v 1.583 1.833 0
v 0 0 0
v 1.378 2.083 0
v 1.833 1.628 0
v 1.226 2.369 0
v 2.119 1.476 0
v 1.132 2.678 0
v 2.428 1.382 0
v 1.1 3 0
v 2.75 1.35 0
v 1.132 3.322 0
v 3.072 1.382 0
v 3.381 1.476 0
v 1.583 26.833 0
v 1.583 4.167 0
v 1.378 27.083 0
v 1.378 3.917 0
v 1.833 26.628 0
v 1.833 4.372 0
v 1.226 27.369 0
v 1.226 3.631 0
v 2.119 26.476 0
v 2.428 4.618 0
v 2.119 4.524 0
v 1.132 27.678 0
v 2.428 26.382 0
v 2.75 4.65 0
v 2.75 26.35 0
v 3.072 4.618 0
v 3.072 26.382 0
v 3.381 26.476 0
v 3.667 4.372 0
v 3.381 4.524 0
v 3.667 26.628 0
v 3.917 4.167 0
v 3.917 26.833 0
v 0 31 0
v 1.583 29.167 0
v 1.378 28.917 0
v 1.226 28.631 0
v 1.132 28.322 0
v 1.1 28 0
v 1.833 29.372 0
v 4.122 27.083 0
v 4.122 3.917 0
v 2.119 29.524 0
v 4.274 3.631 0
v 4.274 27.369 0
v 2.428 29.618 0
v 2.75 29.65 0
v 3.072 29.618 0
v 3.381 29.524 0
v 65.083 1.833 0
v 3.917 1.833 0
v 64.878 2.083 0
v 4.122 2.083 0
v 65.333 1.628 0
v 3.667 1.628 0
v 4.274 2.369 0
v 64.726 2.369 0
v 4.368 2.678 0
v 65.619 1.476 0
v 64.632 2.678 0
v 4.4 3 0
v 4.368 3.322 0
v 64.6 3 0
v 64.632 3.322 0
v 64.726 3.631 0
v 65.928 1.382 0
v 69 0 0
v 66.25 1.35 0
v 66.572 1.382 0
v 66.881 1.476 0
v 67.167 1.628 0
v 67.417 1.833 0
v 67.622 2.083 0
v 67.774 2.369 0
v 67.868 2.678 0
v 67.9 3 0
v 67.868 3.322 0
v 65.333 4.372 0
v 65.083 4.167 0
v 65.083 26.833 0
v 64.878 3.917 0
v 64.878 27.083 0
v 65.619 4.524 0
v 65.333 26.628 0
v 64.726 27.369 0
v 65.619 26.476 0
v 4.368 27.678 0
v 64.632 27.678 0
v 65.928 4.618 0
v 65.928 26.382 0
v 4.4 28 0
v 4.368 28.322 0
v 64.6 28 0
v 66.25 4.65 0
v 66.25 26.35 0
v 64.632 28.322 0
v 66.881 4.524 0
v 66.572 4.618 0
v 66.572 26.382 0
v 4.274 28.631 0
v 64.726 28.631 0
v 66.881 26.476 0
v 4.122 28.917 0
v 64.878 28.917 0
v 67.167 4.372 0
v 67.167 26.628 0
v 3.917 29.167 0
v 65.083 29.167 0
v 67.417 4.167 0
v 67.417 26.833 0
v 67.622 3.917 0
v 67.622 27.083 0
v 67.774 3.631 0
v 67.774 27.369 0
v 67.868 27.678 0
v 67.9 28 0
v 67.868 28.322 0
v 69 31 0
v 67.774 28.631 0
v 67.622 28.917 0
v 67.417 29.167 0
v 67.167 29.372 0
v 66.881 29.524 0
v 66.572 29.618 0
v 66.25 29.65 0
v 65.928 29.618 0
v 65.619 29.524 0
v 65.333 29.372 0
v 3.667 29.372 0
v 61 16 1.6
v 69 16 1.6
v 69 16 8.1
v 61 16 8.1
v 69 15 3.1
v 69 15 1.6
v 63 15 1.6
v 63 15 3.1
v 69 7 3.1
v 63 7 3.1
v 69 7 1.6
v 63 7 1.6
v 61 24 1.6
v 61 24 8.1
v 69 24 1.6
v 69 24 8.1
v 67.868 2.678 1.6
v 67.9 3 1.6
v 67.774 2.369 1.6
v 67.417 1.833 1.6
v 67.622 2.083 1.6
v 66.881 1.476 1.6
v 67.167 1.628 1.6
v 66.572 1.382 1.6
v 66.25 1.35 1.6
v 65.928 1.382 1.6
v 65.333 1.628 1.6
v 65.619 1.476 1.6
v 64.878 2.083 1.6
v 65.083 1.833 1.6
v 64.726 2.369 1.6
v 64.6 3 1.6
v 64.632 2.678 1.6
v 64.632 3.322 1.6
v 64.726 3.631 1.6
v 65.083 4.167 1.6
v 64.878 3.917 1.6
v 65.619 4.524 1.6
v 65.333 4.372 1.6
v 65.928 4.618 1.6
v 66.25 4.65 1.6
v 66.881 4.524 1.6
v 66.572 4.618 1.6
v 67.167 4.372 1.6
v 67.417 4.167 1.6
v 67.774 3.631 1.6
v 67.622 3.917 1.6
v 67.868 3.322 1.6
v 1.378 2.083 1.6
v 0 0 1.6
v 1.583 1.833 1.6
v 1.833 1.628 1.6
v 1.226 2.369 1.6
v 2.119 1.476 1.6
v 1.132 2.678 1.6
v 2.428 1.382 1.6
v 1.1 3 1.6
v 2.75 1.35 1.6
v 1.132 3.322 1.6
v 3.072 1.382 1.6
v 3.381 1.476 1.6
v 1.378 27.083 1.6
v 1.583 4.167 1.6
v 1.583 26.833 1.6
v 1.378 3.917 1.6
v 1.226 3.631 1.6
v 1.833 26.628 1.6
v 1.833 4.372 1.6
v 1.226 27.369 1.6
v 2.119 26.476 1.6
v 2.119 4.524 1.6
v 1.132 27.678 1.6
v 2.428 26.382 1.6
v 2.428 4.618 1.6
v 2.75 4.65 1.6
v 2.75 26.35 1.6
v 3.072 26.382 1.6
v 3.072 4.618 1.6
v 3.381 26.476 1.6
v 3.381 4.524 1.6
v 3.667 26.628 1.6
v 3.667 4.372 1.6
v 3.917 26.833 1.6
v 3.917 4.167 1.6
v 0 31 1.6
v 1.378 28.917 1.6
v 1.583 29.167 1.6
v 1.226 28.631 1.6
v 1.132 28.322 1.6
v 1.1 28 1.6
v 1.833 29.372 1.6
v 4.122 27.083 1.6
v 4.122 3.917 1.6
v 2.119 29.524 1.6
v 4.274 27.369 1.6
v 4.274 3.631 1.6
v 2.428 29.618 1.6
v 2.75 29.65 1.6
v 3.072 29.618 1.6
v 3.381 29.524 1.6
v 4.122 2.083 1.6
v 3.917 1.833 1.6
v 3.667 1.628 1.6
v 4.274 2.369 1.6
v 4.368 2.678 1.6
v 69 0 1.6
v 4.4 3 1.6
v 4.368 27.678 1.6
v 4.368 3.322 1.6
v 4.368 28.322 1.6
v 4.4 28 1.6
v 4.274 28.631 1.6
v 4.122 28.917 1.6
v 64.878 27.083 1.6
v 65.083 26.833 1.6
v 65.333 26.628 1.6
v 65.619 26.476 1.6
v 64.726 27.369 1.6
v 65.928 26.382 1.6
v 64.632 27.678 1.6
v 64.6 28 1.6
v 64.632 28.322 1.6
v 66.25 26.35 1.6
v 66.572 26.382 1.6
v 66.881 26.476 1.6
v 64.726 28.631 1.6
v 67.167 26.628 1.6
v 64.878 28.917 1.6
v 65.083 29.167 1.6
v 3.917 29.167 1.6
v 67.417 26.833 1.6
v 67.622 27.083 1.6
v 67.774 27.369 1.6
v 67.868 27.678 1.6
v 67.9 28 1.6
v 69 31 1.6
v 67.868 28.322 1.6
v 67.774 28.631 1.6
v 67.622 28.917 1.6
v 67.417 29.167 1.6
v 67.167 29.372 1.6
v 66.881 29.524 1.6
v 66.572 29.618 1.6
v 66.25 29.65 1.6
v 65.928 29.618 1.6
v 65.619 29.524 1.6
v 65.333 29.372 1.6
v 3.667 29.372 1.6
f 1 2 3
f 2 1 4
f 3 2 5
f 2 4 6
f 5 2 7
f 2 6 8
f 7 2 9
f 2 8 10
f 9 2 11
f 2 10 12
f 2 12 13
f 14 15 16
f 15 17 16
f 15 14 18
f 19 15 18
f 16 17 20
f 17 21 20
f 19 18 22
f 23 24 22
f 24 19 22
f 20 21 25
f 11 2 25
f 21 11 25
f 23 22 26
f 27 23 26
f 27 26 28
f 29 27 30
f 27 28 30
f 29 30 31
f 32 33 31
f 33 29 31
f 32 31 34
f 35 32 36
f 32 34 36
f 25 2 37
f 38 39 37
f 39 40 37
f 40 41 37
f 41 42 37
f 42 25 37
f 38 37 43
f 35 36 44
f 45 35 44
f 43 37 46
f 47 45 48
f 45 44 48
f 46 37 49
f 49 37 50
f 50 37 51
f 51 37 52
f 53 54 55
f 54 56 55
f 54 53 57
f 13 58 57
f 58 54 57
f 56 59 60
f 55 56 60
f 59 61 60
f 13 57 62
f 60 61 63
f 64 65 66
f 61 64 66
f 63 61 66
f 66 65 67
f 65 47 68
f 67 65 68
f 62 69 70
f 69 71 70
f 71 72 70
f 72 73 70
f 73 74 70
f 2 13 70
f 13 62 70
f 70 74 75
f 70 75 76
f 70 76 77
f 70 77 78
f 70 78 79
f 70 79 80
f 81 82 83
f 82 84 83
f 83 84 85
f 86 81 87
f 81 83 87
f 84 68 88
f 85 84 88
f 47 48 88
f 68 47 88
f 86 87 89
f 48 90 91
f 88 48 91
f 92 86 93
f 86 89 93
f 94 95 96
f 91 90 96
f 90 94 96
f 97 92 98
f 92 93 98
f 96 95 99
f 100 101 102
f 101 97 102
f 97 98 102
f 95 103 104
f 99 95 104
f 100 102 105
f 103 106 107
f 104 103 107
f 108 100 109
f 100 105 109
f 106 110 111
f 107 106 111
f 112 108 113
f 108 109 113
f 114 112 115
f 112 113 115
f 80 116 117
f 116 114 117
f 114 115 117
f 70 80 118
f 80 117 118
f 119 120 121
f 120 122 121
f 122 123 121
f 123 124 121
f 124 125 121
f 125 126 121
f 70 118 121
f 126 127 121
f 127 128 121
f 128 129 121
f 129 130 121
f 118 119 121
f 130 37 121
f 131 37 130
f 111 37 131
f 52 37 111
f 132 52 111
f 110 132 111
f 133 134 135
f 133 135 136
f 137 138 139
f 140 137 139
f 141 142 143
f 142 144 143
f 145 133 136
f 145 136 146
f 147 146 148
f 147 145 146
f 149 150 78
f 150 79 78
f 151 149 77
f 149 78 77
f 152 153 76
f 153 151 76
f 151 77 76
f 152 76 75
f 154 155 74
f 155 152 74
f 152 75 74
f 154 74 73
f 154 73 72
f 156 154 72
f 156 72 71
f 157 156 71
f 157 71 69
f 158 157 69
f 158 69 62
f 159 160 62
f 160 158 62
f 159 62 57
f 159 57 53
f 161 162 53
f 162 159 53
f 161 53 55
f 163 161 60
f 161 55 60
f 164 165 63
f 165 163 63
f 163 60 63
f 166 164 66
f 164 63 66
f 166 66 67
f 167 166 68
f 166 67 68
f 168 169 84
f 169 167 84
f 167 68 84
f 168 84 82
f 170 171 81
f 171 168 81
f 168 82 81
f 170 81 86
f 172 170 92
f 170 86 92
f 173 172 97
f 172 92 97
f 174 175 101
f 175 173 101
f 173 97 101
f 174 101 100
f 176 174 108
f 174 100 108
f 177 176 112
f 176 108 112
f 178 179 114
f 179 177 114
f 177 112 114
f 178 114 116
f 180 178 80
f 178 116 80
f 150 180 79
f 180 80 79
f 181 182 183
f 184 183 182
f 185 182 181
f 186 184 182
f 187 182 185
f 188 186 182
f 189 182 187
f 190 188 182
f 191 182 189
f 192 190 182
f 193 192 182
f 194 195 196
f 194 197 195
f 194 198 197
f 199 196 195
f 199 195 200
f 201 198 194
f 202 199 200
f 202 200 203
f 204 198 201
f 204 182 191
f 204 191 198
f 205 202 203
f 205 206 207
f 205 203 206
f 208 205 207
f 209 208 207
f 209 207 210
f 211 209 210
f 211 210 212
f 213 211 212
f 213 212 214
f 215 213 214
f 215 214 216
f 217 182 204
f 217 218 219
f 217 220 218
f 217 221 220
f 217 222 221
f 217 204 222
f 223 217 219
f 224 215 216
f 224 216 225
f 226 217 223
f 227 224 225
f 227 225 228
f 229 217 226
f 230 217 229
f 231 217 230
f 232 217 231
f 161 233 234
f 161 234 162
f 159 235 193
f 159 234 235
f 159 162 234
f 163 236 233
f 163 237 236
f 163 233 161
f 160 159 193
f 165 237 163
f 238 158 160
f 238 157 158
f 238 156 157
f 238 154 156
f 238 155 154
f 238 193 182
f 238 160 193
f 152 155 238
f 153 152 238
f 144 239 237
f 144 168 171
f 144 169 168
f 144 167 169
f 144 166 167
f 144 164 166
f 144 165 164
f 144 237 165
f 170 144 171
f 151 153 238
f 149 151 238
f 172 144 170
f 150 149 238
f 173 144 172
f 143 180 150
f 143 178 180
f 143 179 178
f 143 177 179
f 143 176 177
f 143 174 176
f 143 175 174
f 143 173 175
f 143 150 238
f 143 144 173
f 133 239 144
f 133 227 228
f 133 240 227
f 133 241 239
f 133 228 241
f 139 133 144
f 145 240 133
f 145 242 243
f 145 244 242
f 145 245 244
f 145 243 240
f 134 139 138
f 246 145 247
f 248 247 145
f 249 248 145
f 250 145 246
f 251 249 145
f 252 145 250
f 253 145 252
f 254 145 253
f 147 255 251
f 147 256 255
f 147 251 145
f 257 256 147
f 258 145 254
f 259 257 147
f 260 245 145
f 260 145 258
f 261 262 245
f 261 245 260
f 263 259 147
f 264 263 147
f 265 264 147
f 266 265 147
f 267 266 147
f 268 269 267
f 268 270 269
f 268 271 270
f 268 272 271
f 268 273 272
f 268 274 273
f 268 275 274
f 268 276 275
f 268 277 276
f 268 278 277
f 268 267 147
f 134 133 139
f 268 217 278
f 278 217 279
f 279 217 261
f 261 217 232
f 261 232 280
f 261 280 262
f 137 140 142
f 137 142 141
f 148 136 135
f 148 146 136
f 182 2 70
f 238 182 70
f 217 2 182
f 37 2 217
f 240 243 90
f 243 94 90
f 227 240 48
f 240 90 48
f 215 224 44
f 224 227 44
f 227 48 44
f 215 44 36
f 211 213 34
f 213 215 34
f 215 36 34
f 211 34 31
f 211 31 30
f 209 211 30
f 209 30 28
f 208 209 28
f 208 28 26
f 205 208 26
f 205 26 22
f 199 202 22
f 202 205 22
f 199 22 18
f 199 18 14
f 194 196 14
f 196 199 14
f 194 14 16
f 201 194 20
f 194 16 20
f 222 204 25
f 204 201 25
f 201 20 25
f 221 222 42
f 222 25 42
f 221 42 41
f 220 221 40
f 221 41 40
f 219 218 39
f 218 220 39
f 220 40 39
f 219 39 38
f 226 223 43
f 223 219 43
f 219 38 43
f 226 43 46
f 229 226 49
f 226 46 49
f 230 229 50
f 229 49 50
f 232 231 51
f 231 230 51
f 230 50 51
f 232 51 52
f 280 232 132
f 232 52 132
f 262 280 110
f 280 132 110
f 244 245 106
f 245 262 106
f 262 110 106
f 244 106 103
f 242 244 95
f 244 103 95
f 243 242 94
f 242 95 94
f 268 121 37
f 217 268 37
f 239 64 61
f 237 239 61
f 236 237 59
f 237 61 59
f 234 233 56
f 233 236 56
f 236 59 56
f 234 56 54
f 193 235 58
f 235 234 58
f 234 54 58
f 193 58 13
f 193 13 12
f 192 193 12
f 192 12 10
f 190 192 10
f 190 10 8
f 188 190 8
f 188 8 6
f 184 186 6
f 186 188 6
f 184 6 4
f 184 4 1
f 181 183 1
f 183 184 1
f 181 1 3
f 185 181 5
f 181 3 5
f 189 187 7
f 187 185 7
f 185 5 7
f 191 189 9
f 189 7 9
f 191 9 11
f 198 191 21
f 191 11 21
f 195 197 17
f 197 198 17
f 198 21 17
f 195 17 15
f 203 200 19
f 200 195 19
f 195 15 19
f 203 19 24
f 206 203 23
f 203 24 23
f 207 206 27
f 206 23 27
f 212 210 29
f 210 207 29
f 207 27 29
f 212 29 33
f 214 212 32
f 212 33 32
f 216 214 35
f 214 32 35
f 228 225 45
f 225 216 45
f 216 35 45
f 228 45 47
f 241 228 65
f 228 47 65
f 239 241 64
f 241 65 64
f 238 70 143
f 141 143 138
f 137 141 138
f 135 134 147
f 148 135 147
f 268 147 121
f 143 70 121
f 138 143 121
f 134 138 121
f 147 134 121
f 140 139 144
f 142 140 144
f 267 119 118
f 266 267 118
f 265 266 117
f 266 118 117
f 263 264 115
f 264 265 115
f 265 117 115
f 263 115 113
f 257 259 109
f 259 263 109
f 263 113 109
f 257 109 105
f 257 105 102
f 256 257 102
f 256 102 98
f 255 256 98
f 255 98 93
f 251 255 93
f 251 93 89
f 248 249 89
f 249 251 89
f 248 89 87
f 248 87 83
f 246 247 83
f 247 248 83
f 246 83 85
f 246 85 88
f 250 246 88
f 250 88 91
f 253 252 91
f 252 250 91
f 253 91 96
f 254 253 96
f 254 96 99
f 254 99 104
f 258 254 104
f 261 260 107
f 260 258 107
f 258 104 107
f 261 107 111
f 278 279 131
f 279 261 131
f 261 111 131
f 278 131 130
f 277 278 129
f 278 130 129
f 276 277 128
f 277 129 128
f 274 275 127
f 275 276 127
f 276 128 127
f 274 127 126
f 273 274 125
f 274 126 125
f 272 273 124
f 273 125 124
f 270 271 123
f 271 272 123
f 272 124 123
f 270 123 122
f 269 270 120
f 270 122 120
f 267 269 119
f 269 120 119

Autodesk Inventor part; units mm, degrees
ref_plane "YZ Plane" through (0, 0, 0) normal (1, 0, 0) x (0, 1, 0)
ref_plane "XZ Plane" through (0, 0, 0) normal (0, 1, 0) x (-1, 0, 0)
ref_plane "XY Plane" through (0, 0, 0) normal (0, 0, 1) x (1, 0, 0)
sketch "Skizze1" plane through (0, 0, 0) normal (0, 0, 1) x (1, 0, 0)
  line L0 (-13.8, 0) -> (82.8, 0) projected
  line L1 (0, -6.2) -> (0, 37.2) projected
  line L2 (0, 0) -> (69, 0)
  line L3 (69, 0) -> (69, 31)
  line L4 (69, 31) -> (0, 31)
  line L5 (0, 31) -> (0, 0)
  line L6 (2.75, 28) -> (66.25, 28) construction
  line L7 (66.25, 28) -> (66.25, 3) construction
  line L8 (66.25, 3) -> (2.75, 3) construction
  line L9 (2.75, 3) -> (2.75, 28) construction
  circle A0 centre (2.75, 28) radius 1.65
  circle A1 centre (2.75, 3) radius 1.65
  circle A2 centre (66.25, 28) radius 1.65
  circle A3 centre (66.25, 3) radius 1.65
  dimension "d0" = 31
  dimension "d1" = 69
  dimension "d4" = 25
  dimension "d5" = 63.5
  dimension "d6" = 2.75
  dimension "d7" = 3
  dimension "d8" = 3.3
extrude "Extrusion2" add sketch "Skizze1" along normal blind 1.6
sketch "Skizze2" plane through (0, 0, 1.6) normal (0, 0, 1) x (1, 0, 0)
  line L0 (69, 0) -> (69, 31) projected
  line L1 (69, 31) -> (0, 31) projected
  line L2 (69, 16) -> (61, 16)
  line L3 (61, 16) -> (61, 24)
  line L4 (61, 24) -> (69, 24)
  line L5 (69, 24) -> (69, 16)
  dimension "d11" = 15
  dimension "d12" = 8
  dimension "d13" = 8
extrude "Extrusion3" add sketch "Skizze2" along normal blind 6.5
sketch "Skizze3" plane through (0, 0, 1.6) normal (0, 0, 1) x (1, 0, 0)
  line L0 (0, 0) -> (69, 0) projected
  line L1 (69, 0) -> (69, 16) projected
  line L2 (69, 15) -> (63, 15)
  line L3 (63, 15) -> (63, 7)
  line L4 (63, 7) -> (69, 7)
  line L5 (69, 7) -> (69, 15)
  dimension "d16" = 8
  dimension "d17" = 6
  dimension "d18" = 15
extrude "Extrusion4" add sketch "Skizze3" along normal blind 1.5
properties part number "IOIO Board"
